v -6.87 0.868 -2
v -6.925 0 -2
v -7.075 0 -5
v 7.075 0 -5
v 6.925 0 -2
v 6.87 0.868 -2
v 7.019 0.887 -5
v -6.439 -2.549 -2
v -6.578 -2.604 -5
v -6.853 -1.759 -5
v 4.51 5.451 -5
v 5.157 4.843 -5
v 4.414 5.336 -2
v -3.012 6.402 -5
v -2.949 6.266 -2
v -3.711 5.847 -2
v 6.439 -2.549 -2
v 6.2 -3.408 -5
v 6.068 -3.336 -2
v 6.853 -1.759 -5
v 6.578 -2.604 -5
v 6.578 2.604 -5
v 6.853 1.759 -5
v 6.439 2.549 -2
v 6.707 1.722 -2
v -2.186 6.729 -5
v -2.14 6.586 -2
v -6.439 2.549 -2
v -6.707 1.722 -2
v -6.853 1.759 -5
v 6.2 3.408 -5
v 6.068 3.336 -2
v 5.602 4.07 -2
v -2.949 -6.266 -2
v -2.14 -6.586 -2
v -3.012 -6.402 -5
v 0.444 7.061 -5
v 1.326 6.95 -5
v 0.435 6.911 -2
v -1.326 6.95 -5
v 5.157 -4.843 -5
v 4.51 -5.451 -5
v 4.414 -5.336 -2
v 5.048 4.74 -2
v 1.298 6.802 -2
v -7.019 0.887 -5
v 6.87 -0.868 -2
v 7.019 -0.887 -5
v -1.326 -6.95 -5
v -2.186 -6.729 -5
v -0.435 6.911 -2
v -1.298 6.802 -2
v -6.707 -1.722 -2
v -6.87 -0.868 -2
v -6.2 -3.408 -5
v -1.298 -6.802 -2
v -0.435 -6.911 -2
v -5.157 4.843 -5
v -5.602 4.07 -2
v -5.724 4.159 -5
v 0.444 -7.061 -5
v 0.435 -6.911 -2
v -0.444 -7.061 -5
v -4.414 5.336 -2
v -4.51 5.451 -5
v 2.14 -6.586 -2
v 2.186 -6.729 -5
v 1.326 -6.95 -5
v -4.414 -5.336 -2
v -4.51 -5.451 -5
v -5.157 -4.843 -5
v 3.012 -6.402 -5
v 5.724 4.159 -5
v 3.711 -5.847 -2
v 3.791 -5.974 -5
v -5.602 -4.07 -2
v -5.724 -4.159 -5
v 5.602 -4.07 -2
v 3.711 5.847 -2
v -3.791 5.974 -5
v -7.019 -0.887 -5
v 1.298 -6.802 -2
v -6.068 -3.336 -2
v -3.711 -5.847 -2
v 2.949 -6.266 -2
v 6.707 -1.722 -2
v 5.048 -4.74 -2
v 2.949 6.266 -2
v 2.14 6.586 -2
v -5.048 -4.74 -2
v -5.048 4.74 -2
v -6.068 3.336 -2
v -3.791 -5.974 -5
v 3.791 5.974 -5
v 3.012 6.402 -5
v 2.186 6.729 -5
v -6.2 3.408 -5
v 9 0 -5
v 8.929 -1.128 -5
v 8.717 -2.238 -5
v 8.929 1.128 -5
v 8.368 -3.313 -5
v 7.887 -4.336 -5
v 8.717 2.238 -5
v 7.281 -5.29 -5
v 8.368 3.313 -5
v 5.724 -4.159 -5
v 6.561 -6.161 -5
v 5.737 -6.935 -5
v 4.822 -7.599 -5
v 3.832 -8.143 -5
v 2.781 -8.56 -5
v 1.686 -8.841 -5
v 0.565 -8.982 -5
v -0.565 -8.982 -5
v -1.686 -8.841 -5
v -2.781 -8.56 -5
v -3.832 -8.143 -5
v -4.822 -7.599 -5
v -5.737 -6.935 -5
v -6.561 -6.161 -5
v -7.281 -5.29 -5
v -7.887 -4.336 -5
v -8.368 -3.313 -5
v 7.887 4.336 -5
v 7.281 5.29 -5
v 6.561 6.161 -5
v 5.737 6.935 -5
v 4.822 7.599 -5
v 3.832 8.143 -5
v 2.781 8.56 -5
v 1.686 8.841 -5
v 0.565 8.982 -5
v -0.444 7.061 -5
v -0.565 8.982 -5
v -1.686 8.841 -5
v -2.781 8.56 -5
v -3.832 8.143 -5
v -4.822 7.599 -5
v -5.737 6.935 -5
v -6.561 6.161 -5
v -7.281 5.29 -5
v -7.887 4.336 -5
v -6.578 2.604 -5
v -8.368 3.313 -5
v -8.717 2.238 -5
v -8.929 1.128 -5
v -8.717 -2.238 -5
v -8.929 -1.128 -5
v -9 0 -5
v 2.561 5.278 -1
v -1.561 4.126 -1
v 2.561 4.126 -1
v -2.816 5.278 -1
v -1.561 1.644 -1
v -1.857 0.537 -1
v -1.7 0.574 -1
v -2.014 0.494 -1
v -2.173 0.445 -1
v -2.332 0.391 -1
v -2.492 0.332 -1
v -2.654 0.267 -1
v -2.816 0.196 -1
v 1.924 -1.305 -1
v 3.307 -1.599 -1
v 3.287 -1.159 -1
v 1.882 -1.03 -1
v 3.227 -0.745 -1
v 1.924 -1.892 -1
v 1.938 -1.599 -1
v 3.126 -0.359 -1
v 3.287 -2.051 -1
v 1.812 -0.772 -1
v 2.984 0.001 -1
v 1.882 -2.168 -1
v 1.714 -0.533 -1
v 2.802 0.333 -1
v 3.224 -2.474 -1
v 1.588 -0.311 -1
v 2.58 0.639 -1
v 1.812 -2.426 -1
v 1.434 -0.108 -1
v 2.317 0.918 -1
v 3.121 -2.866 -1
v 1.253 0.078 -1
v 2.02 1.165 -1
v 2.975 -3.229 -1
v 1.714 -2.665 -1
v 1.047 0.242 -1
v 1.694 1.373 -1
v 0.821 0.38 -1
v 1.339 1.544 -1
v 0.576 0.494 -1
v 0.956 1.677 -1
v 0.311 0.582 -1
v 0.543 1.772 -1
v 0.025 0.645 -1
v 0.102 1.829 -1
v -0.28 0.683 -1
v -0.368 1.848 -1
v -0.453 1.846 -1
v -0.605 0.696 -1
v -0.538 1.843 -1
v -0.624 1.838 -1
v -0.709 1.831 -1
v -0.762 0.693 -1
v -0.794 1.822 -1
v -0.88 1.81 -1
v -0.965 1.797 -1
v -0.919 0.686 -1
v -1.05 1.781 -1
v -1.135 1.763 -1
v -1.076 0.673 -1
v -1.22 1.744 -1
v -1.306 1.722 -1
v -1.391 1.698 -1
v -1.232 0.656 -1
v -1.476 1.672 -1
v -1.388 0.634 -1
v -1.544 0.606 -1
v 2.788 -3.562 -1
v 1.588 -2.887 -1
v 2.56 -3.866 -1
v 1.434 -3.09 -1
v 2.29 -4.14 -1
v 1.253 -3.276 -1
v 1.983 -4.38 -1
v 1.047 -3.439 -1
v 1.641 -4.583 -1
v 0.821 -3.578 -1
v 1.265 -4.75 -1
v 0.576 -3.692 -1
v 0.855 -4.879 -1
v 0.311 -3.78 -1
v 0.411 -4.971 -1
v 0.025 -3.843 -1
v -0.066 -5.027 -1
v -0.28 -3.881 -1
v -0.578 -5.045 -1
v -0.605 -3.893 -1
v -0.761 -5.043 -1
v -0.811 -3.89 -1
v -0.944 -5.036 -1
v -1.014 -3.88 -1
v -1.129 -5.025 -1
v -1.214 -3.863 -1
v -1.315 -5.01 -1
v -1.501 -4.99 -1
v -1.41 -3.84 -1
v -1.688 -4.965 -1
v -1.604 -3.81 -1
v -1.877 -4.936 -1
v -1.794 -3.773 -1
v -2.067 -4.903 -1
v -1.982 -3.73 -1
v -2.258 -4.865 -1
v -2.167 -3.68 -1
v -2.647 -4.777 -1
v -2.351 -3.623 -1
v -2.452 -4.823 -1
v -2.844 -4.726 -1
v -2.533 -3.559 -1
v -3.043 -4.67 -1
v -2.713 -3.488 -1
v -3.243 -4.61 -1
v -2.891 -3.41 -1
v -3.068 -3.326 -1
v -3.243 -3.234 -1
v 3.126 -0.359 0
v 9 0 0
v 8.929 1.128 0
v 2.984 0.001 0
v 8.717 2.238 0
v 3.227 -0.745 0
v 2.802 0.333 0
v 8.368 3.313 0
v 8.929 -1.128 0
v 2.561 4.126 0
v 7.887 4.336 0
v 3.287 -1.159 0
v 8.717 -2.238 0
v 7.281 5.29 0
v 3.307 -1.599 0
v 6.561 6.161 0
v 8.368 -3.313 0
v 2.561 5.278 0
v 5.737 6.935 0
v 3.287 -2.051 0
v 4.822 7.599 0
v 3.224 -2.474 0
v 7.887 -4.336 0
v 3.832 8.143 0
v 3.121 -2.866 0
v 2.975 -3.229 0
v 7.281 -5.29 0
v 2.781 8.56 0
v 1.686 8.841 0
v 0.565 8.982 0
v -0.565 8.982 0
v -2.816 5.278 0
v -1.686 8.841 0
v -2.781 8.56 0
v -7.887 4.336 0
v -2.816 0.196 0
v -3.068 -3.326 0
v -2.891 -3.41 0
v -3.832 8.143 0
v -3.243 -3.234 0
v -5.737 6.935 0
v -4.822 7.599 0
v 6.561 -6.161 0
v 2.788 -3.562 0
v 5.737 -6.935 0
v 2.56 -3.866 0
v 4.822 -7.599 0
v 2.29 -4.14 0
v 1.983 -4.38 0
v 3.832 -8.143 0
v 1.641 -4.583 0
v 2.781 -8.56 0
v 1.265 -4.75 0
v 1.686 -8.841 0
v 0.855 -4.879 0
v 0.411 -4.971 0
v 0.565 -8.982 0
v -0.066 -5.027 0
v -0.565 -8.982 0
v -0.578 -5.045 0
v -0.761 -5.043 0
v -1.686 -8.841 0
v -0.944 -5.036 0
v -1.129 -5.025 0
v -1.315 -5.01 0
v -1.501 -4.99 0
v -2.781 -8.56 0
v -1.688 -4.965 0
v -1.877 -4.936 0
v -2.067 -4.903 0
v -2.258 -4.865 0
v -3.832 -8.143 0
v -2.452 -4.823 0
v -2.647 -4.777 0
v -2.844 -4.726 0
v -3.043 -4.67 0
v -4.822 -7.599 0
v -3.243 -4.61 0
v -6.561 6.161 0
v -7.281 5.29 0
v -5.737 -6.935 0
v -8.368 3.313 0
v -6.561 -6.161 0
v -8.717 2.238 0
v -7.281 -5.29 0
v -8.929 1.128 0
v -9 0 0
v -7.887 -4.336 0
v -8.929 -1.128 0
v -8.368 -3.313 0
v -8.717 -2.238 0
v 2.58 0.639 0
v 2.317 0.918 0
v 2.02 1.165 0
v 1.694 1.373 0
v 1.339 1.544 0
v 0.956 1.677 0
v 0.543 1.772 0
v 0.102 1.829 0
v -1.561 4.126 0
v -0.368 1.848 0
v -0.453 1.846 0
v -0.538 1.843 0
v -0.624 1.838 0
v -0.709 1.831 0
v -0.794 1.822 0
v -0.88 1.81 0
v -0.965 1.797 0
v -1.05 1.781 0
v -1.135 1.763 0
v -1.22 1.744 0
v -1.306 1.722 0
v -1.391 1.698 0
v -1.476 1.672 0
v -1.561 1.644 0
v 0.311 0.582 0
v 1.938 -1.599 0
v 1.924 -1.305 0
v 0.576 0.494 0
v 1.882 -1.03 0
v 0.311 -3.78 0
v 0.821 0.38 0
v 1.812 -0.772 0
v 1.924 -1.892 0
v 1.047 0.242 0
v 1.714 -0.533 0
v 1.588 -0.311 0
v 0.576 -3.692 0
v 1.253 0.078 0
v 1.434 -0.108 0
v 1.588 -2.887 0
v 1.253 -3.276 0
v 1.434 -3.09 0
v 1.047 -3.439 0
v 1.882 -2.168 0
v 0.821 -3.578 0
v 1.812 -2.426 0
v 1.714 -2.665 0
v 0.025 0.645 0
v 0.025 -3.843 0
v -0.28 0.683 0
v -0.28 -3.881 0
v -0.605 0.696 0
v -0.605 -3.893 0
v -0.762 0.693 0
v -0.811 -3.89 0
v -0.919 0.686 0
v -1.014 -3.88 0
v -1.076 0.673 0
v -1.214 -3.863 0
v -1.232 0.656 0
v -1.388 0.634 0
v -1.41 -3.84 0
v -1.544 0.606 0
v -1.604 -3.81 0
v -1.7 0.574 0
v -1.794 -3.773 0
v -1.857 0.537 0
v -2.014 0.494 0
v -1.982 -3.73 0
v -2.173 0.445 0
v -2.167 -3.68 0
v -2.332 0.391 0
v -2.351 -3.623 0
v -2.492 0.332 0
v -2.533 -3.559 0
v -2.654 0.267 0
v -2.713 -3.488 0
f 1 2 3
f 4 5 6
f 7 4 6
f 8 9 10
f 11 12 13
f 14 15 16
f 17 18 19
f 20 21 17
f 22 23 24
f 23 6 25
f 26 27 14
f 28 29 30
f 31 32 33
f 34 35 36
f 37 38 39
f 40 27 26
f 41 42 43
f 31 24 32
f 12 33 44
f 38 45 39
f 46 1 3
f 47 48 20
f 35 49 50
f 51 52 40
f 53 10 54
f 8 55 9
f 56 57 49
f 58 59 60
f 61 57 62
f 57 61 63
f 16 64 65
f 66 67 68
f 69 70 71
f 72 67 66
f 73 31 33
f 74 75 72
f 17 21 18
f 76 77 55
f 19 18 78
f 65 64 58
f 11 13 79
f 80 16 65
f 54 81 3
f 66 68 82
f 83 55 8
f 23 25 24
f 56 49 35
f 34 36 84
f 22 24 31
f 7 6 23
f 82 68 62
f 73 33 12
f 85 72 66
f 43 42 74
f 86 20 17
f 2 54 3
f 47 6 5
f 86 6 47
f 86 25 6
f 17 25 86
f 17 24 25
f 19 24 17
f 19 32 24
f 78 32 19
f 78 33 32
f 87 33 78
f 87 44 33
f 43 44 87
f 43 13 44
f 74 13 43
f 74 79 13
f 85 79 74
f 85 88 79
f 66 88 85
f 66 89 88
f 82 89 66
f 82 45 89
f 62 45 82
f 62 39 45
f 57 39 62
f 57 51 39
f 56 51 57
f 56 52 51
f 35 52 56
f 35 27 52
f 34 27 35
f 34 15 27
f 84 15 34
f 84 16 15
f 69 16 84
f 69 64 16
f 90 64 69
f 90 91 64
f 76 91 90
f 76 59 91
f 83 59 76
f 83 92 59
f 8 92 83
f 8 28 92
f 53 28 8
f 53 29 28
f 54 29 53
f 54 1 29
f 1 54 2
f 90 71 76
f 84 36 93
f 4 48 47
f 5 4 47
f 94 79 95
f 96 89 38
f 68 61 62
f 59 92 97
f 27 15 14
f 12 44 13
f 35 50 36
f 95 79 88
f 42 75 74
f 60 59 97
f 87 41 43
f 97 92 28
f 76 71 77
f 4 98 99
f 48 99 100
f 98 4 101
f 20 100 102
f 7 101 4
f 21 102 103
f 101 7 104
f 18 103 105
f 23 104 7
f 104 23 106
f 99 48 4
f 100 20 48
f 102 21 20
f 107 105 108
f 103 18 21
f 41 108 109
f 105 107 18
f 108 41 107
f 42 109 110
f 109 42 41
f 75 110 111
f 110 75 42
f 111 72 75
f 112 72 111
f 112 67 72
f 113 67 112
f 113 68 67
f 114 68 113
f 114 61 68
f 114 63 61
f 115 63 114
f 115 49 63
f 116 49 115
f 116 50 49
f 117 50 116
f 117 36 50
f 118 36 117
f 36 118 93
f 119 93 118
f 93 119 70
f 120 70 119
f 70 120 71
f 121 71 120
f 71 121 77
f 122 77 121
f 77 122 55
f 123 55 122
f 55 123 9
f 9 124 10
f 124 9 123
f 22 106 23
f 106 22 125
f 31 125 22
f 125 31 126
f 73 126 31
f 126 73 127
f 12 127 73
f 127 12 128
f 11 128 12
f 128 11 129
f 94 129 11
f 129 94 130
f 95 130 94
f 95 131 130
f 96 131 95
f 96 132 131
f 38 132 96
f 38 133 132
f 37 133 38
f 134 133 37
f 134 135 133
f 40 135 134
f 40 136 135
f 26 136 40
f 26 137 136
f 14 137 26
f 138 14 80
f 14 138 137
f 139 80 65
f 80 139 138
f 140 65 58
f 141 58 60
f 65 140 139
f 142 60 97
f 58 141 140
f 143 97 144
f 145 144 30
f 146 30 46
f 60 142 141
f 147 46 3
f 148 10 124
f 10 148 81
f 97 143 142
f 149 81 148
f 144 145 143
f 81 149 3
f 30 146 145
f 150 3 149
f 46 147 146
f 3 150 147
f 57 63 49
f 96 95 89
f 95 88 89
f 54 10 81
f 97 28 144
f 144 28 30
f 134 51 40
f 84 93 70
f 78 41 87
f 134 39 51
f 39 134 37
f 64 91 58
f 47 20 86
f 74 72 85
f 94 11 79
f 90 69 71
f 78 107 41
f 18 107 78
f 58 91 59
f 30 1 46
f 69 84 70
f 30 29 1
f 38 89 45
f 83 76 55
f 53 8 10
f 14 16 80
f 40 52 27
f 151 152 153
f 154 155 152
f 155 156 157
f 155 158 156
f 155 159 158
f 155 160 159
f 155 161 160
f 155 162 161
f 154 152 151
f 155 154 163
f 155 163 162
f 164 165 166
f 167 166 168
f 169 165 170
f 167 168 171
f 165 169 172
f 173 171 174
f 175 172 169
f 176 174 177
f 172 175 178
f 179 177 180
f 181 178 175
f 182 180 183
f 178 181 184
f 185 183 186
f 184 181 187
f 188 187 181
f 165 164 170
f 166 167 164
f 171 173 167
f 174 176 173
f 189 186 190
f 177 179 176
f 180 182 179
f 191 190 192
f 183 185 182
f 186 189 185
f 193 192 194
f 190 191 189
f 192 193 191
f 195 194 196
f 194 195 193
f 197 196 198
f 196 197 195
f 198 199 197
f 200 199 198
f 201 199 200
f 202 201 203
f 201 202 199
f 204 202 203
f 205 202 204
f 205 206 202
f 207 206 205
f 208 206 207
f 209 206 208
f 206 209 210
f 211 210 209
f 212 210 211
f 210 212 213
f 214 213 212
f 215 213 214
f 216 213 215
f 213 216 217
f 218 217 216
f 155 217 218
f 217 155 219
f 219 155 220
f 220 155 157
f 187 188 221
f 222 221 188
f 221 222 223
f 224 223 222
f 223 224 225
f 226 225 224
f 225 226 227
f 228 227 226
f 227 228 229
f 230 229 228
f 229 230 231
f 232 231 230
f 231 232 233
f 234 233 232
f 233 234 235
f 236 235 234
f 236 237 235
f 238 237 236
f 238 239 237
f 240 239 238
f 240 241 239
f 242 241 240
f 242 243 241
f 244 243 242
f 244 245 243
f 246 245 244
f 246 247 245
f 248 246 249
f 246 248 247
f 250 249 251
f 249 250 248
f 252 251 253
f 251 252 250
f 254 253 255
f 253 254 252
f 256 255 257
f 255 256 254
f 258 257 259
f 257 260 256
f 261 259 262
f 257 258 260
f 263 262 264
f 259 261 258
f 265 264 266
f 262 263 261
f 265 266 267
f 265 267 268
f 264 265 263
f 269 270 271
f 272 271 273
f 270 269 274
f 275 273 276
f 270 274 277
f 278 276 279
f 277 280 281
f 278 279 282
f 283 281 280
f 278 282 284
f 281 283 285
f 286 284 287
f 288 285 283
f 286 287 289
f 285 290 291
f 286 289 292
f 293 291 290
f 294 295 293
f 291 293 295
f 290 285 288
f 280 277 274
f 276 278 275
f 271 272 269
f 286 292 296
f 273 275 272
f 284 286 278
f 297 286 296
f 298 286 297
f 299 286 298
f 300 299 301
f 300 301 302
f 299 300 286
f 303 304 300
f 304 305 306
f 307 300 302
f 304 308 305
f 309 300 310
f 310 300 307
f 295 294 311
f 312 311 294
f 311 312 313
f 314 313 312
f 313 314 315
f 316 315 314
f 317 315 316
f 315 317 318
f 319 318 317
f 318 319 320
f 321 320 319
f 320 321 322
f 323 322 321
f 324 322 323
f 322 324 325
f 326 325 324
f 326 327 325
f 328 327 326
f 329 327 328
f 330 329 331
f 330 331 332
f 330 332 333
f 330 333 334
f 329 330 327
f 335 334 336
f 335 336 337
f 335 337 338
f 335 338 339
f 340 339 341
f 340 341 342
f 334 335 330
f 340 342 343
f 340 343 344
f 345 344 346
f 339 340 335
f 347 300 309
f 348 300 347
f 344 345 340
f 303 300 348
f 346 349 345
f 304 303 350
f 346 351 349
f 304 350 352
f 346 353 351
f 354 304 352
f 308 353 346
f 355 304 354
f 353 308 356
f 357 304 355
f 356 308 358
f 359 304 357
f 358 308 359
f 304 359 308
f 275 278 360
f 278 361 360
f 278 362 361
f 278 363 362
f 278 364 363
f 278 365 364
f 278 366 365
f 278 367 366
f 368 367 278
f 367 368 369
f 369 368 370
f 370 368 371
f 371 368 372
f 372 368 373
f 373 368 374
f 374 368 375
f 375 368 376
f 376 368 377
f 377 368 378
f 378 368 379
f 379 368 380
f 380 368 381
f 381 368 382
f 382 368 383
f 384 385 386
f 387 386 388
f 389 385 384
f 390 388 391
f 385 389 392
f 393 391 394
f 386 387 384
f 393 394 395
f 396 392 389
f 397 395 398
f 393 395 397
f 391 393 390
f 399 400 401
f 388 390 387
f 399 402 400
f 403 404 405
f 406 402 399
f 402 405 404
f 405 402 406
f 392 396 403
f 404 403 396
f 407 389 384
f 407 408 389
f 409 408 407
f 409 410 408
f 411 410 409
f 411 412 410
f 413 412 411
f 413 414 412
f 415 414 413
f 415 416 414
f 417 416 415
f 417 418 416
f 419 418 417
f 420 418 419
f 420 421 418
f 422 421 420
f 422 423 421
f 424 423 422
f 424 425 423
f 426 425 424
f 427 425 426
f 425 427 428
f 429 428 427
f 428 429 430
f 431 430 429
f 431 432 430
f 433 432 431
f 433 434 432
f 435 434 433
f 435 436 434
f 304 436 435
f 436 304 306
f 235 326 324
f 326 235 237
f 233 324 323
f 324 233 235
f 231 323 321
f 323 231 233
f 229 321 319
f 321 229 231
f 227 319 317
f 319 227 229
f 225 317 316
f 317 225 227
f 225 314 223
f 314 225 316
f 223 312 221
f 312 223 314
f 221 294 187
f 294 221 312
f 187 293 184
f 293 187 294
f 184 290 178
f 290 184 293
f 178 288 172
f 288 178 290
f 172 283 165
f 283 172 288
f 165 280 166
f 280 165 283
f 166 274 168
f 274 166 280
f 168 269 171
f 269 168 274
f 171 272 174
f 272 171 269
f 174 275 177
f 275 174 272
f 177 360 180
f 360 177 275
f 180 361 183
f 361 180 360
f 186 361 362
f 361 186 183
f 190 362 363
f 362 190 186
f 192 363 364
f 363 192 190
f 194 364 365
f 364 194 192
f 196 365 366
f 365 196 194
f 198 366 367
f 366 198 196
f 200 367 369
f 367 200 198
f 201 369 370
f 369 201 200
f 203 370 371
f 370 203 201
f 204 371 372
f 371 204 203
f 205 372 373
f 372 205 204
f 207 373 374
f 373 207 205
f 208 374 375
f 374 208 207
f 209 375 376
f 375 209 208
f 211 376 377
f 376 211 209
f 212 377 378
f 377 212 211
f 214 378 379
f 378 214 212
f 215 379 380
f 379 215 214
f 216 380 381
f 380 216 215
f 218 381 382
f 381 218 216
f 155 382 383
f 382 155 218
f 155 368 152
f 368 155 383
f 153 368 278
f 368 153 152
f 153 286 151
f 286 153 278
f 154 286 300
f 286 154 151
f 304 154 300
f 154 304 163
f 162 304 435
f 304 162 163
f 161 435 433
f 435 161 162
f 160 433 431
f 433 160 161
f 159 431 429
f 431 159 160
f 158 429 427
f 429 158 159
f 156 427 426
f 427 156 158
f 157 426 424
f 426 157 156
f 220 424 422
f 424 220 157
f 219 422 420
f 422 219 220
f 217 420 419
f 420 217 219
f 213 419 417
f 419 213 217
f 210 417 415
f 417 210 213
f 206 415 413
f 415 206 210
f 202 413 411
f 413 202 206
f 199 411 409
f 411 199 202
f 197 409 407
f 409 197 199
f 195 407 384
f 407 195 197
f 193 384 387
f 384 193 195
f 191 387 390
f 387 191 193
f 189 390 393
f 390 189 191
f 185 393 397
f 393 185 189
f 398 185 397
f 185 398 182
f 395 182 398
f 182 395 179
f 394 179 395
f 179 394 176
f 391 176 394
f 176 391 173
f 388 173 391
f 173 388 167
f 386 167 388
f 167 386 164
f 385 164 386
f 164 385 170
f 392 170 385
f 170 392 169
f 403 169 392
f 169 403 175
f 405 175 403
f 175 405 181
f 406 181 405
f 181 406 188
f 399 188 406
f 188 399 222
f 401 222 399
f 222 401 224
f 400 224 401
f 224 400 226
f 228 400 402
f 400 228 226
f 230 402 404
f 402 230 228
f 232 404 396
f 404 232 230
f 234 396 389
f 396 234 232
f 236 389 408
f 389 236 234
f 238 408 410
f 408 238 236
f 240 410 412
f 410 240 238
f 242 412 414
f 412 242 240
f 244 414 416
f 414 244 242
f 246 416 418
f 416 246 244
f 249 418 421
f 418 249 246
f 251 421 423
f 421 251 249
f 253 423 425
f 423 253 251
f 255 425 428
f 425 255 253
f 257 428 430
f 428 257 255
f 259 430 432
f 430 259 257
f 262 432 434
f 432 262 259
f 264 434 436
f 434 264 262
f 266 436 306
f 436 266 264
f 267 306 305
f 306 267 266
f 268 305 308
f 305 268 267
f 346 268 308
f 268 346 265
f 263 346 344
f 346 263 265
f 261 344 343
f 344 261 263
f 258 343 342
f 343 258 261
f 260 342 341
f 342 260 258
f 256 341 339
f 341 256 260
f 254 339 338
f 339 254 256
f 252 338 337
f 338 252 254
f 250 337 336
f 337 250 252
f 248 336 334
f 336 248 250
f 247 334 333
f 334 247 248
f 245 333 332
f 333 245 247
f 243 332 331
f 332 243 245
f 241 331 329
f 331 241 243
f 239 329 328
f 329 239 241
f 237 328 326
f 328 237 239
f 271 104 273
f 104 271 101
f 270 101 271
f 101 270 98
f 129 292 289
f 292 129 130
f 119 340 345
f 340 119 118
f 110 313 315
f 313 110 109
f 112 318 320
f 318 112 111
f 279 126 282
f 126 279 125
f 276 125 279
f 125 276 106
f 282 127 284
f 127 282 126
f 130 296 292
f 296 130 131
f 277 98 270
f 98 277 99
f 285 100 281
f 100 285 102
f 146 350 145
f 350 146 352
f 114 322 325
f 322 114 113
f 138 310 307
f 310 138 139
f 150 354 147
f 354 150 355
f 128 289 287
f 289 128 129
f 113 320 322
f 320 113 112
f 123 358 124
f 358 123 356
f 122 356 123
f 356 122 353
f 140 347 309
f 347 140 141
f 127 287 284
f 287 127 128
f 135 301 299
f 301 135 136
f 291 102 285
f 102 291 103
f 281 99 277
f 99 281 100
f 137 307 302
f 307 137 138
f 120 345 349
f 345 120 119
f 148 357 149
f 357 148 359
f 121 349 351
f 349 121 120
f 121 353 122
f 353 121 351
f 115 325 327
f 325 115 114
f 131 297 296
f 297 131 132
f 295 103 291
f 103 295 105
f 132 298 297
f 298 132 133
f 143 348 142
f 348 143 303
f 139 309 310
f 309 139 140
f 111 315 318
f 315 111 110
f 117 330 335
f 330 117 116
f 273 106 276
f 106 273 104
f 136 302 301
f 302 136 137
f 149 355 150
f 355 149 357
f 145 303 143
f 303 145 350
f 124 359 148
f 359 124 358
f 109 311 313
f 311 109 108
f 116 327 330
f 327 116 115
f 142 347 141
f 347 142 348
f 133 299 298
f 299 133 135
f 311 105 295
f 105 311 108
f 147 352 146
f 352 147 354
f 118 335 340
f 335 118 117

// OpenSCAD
$fn = 50;


difference() {
	union() {
		translate(v = [0, 0, -5.0000000000]) {
			cylinder(h = 5, r = 9.0000000000);
		}
	}
	union() {
		#translate(v = [0, 0, -5.0000000000]) {
			cylinder(h = 3, r1 = 7.0750000000, r2 = 6.9250000000);
		}
		translate(v = [0, 0, -1]) {
			linear_extrude(height = 1) {
				text(font = "Impact", halign = "center", size = 10, text = "5", valign = "center");
			}
		}
	}
}
